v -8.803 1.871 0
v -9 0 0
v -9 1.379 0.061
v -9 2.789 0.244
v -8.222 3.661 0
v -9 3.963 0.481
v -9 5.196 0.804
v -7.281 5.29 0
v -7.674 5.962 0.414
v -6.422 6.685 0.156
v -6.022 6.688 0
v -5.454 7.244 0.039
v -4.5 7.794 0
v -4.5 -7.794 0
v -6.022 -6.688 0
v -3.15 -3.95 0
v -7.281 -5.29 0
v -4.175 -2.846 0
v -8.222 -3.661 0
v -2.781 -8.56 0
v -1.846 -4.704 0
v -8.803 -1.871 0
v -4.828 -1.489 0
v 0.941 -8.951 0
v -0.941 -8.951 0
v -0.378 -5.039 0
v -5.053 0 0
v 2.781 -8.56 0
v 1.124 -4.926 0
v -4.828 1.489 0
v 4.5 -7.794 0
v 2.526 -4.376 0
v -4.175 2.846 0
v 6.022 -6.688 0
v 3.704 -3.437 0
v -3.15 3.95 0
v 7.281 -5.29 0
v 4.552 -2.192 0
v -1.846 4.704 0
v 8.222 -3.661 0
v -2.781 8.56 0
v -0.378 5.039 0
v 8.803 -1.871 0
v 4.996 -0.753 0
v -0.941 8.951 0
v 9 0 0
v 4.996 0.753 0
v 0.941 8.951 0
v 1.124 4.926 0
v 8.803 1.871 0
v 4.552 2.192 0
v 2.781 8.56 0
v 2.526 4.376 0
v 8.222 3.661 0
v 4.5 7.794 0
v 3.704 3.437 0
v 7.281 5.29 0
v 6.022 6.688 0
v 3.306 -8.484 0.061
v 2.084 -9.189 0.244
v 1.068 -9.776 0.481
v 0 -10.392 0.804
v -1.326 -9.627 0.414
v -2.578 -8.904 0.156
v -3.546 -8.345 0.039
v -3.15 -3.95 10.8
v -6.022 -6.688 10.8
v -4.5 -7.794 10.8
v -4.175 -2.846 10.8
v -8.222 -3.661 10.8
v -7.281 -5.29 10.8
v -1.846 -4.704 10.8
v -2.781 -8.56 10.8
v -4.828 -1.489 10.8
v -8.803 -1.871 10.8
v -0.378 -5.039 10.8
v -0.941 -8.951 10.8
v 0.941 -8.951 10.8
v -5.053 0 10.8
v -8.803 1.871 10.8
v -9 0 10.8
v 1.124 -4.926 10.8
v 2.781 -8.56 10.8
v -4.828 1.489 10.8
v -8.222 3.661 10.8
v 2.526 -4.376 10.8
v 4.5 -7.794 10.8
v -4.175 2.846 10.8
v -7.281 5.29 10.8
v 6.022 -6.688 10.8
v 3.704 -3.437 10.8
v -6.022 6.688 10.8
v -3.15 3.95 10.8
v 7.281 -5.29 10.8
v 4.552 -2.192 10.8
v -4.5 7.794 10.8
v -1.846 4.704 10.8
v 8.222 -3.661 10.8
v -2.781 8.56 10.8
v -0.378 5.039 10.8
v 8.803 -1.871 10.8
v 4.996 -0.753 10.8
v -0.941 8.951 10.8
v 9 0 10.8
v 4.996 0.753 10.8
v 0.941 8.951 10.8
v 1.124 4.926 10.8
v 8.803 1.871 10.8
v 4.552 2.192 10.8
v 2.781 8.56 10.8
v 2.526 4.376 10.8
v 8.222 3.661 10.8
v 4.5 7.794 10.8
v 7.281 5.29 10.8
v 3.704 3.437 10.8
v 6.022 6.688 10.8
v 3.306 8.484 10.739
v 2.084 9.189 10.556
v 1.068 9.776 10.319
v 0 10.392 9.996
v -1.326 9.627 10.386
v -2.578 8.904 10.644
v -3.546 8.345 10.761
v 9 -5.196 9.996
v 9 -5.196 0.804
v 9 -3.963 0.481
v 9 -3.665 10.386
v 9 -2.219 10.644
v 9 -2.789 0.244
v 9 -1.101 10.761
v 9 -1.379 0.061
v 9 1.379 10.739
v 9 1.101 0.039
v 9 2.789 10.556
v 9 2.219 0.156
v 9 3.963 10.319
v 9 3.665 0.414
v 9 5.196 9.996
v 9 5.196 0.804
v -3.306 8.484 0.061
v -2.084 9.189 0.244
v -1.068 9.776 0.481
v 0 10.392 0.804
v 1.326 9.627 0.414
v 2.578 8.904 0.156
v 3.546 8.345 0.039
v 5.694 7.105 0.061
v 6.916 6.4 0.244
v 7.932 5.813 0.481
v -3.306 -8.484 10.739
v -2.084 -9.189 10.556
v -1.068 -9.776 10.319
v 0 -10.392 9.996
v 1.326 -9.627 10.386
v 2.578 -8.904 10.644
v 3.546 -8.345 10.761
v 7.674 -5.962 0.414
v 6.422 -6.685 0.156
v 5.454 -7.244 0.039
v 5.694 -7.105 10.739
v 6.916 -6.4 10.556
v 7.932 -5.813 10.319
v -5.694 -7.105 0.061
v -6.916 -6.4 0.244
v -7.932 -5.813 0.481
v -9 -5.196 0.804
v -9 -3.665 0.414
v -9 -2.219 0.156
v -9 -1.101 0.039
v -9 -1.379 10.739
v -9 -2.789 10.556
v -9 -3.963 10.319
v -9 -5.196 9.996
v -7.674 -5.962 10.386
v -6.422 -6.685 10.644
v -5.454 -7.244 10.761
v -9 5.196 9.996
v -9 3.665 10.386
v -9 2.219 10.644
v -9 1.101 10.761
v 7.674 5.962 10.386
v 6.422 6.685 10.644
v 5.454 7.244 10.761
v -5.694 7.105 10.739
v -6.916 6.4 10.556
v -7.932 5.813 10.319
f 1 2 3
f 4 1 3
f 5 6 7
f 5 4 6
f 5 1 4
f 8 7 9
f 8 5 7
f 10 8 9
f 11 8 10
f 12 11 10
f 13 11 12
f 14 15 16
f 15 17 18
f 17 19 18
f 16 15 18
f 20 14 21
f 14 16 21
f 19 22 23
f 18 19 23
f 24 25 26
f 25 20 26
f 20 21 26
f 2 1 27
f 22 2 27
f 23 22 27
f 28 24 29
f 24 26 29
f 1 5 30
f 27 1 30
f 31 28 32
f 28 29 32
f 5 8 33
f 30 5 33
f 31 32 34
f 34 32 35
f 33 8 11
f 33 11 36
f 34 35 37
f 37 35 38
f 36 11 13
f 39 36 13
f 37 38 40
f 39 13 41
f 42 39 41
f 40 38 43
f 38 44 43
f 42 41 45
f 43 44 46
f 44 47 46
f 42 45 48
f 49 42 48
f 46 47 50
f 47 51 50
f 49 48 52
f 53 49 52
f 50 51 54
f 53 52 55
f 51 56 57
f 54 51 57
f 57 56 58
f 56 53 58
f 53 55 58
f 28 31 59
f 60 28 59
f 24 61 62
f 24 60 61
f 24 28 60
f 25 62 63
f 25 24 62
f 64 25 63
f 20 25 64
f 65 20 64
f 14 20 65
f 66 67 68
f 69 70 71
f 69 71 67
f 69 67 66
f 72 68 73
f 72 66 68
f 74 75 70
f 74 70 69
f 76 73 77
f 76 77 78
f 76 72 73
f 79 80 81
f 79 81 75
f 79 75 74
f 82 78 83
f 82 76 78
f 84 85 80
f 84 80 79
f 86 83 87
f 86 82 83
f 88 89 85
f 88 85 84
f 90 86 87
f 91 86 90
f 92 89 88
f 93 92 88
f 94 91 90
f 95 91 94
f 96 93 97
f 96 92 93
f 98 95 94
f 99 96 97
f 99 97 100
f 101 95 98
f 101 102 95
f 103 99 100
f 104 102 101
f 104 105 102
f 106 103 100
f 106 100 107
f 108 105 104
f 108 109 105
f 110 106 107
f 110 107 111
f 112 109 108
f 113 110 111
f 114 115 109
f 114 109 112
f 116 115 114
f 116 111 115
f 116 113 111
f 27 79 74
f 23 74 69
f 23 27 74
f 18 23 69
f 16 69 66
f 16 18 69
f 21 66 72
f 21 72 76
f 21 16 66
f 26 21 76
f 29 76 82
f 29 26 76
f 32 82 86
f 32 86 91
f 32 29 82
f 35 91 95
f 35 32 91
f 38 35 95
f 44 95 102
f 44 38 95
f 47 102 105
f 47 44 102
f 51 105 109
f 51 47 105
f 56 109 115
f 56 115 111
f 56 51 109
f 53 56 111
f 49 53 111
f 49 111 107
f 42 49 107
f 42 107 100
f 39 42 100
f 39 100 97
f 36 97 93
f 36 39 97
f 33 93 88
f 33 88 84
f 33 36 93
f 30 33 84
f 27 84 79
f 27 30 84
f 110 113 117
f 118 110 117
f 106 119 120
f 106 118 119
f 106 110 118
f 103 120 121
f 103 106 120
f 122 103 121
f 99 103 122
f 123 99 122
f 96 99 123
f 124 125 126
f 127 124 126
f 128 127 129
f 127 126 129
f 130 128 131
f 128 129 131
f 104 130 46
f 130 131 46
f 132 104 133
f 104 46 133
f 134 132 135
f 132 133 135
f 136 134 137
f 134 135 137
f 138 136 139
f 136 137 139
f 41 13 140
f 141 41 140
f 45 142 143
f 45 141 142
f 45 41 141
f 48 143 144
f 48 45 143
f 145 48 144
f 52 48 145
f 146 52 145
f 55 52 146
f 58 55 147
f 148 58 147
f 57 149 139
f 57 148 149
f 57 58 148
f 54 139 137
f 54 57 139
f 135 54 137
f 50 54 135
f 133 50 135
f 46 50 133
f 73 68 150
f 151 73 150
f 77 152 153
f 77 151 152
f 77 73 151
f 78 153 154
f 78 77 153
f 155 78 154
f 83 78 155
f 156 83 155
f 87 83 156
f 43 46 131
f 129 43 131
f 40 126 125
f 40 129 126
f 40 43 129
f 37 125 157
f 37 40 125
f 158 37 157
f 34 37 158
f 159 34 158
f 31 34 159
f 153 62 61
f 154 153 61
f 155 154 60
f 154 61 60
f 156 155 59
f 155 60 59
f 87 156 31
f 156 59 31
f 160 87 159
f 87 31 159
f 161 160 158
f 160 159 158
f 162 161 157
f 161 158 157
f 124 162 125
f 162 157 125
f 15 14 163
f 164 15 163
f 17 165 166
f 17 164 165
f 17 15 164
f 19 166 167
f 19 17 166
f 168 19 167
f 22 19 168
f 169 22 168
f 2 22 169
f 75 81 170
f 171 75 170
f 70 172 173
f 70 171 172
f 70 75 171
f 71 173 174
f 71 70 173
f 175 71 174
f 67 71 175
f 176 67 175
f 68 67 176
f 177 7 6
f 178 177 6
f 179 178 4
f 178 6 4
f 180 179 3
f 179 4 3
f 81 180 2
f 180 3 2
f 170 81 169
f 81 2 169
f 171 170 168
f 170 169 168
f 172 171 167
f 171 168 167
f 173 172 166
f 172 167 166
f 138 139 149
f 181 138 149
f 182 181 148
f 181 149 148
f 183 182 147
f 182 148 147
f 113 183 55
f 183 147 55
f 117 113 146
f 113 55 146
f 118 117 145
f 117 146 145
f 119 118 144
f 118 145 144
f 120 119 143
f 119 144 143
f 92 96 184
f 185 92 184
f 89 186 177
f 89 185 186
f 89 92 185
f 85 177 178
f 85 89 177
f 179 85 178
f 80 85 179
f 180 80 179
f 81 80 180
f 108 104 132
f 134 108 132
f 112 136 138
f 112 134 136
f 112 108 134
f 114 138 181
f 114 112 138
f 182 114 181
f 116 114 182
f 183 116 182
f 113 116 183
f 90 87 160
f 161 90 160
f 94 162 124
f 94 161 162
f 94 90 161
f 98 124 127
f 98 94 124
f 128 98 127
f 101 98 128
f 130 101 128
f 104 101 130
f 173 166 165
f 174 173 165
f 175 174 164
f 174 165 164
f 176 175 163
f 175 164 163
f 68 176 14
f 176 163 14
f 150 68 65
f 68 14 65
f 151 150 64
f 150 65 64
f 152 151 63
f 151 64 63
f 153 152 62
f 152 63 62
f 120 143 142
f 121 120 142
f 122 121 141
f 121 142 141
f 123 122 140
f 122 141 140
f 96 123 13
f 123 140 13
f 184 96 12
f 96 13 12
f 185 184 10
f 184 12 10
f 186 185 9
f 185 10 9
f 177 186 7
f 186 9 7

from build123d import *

# Parameters (mm, degrees)
SKETCH_1_R          = 5.0528125
EXTRUDE_597_DEPTH   = 10.8
SKETCH_2_OUTSIDE_W  = 89.934
SKETCH_2_OUTSIDE_H  = 92.718
SKETCH_2_OUTSIDE_R  = 9
CUT_EXTRUDE_1_DEPTH = 18.482562741
CUT_EXTRUDE_1_DRAFT = -60
SKETCH_3_OUTSIDE_W  = 89.934
SKETCH_3_OUTSIDE_H  = 92.718
SKETCH_3_OUTSIDE_R  = 9
CUT_EXTRUDE_2_DEPTH = 18.482562741
CUT_EXTRUDE_2_DRAFT = -60


with BuildPart() as part:
    # 草图1 → Extrude 597 (new body)
    with BuildSketch(Plane.XY):
        Polygon((0, 10.392304845), (-9, 5.196152423), (-9, -5.196152423), (0, -10.392304845), (9, -5.196152423), (9, 5.196152423), align=None)
        with Locations(Location((0, 0, 0), (0, 0, 180))):
            Circle(SKETCH_1_R, mode=Mode.SUBTRACT)
    extrude(amount=EXTRUDE_597_DEPTH)


with BuildPart() as cut_extrude_1_tool:
    # 草图2 outside → 切除-拉伸1 (with draft: the straight prism first)
    with BuildSketch(Plane(origin=(0, 0, 0), x_dir=(-1, 0, 0), z_dir=(0, 0, -1))):
        Rectangle(SKETCH_2_OUTSIDE_W, SKETCH_2_OUTSIDE_H)
        Circle(SKETCH_2_OUTSIDE_R, mode=Mode.SUBTRACT)
    extrude(amount=-CUT_EXTRUDE_1_DEPTH)
    # 切除-拉伸1: the draft: its side faces are tilted about the plane it starts from
    cut_extrude_1_sides = [cut_extrude_1_tool.faces().sort_by_distance(p)[0] for p in [
        (0, -46.359, 9.241281371),
        (-44.967, 0, 9.241281371),
        (0, 46.359, 9.241281371),
        (44.967, 0, 9.241281371),
        (9, 0, 9.241281371),
    ]]
    draft(cut_extrude_1_sides, Plane(origin=(0, 0, 0), x_dir=(-1, 0, 0), z_dir=(0, 0, -1)), CUT_EXTRUDE_1_DRAFT)


with BuildPart() as part_1:
    add(part.part)

    # 切除-拉伸1: cut by cut_extrude_1_tool
    add(cut_extrude_1_tool.part, mode=Mode.SUBTRACT)


with BuildPart() as cut_extrude_2_tool:
    # 草图3 outside → 切除-拉伸2 (with draft: the straight prism first)
    with BuildSketch(Plane.XY.offset(10.8)):
        Rectangle(SKETCH_3_OUTSIDE_W, SKETCH_3_OUTSIDE_H)
        Circle(SKETCH_3_OUTSIDE_R, mode=Mode.SUBTRACT)
    extrude(amount=-CUT_EXTRUDE_2_DEPTH)
    # 切除-拉伸2: the draft: its side faces are tilted about the plane it starts from
    cut_extrude_2_sides = [cut_extrude_2_tool.faces().sort_by_distance(p)[0] for p in [
        (0, -46.359, 1.558718629),
        (44.967, 0, 1.558718629),
        (0, 46.359, 1.558718629),
        (-44.967, 0, 1.558718629),
        (-9, 0, 1.558718629),
    ]]
    draft(cut_extrude_2_sides, Plane.XY.offset(10.8), CUT_EXTRUDE_2_DRAFT)


with BuildPart() as part_2:
    add(part_1.part)

    # 切除-拉伸2: cut by cut_extrude_2_tool
    add(cut_extrude_2_tool.part, mode=Mode.SUBTRACT)


solid = part_2.part
